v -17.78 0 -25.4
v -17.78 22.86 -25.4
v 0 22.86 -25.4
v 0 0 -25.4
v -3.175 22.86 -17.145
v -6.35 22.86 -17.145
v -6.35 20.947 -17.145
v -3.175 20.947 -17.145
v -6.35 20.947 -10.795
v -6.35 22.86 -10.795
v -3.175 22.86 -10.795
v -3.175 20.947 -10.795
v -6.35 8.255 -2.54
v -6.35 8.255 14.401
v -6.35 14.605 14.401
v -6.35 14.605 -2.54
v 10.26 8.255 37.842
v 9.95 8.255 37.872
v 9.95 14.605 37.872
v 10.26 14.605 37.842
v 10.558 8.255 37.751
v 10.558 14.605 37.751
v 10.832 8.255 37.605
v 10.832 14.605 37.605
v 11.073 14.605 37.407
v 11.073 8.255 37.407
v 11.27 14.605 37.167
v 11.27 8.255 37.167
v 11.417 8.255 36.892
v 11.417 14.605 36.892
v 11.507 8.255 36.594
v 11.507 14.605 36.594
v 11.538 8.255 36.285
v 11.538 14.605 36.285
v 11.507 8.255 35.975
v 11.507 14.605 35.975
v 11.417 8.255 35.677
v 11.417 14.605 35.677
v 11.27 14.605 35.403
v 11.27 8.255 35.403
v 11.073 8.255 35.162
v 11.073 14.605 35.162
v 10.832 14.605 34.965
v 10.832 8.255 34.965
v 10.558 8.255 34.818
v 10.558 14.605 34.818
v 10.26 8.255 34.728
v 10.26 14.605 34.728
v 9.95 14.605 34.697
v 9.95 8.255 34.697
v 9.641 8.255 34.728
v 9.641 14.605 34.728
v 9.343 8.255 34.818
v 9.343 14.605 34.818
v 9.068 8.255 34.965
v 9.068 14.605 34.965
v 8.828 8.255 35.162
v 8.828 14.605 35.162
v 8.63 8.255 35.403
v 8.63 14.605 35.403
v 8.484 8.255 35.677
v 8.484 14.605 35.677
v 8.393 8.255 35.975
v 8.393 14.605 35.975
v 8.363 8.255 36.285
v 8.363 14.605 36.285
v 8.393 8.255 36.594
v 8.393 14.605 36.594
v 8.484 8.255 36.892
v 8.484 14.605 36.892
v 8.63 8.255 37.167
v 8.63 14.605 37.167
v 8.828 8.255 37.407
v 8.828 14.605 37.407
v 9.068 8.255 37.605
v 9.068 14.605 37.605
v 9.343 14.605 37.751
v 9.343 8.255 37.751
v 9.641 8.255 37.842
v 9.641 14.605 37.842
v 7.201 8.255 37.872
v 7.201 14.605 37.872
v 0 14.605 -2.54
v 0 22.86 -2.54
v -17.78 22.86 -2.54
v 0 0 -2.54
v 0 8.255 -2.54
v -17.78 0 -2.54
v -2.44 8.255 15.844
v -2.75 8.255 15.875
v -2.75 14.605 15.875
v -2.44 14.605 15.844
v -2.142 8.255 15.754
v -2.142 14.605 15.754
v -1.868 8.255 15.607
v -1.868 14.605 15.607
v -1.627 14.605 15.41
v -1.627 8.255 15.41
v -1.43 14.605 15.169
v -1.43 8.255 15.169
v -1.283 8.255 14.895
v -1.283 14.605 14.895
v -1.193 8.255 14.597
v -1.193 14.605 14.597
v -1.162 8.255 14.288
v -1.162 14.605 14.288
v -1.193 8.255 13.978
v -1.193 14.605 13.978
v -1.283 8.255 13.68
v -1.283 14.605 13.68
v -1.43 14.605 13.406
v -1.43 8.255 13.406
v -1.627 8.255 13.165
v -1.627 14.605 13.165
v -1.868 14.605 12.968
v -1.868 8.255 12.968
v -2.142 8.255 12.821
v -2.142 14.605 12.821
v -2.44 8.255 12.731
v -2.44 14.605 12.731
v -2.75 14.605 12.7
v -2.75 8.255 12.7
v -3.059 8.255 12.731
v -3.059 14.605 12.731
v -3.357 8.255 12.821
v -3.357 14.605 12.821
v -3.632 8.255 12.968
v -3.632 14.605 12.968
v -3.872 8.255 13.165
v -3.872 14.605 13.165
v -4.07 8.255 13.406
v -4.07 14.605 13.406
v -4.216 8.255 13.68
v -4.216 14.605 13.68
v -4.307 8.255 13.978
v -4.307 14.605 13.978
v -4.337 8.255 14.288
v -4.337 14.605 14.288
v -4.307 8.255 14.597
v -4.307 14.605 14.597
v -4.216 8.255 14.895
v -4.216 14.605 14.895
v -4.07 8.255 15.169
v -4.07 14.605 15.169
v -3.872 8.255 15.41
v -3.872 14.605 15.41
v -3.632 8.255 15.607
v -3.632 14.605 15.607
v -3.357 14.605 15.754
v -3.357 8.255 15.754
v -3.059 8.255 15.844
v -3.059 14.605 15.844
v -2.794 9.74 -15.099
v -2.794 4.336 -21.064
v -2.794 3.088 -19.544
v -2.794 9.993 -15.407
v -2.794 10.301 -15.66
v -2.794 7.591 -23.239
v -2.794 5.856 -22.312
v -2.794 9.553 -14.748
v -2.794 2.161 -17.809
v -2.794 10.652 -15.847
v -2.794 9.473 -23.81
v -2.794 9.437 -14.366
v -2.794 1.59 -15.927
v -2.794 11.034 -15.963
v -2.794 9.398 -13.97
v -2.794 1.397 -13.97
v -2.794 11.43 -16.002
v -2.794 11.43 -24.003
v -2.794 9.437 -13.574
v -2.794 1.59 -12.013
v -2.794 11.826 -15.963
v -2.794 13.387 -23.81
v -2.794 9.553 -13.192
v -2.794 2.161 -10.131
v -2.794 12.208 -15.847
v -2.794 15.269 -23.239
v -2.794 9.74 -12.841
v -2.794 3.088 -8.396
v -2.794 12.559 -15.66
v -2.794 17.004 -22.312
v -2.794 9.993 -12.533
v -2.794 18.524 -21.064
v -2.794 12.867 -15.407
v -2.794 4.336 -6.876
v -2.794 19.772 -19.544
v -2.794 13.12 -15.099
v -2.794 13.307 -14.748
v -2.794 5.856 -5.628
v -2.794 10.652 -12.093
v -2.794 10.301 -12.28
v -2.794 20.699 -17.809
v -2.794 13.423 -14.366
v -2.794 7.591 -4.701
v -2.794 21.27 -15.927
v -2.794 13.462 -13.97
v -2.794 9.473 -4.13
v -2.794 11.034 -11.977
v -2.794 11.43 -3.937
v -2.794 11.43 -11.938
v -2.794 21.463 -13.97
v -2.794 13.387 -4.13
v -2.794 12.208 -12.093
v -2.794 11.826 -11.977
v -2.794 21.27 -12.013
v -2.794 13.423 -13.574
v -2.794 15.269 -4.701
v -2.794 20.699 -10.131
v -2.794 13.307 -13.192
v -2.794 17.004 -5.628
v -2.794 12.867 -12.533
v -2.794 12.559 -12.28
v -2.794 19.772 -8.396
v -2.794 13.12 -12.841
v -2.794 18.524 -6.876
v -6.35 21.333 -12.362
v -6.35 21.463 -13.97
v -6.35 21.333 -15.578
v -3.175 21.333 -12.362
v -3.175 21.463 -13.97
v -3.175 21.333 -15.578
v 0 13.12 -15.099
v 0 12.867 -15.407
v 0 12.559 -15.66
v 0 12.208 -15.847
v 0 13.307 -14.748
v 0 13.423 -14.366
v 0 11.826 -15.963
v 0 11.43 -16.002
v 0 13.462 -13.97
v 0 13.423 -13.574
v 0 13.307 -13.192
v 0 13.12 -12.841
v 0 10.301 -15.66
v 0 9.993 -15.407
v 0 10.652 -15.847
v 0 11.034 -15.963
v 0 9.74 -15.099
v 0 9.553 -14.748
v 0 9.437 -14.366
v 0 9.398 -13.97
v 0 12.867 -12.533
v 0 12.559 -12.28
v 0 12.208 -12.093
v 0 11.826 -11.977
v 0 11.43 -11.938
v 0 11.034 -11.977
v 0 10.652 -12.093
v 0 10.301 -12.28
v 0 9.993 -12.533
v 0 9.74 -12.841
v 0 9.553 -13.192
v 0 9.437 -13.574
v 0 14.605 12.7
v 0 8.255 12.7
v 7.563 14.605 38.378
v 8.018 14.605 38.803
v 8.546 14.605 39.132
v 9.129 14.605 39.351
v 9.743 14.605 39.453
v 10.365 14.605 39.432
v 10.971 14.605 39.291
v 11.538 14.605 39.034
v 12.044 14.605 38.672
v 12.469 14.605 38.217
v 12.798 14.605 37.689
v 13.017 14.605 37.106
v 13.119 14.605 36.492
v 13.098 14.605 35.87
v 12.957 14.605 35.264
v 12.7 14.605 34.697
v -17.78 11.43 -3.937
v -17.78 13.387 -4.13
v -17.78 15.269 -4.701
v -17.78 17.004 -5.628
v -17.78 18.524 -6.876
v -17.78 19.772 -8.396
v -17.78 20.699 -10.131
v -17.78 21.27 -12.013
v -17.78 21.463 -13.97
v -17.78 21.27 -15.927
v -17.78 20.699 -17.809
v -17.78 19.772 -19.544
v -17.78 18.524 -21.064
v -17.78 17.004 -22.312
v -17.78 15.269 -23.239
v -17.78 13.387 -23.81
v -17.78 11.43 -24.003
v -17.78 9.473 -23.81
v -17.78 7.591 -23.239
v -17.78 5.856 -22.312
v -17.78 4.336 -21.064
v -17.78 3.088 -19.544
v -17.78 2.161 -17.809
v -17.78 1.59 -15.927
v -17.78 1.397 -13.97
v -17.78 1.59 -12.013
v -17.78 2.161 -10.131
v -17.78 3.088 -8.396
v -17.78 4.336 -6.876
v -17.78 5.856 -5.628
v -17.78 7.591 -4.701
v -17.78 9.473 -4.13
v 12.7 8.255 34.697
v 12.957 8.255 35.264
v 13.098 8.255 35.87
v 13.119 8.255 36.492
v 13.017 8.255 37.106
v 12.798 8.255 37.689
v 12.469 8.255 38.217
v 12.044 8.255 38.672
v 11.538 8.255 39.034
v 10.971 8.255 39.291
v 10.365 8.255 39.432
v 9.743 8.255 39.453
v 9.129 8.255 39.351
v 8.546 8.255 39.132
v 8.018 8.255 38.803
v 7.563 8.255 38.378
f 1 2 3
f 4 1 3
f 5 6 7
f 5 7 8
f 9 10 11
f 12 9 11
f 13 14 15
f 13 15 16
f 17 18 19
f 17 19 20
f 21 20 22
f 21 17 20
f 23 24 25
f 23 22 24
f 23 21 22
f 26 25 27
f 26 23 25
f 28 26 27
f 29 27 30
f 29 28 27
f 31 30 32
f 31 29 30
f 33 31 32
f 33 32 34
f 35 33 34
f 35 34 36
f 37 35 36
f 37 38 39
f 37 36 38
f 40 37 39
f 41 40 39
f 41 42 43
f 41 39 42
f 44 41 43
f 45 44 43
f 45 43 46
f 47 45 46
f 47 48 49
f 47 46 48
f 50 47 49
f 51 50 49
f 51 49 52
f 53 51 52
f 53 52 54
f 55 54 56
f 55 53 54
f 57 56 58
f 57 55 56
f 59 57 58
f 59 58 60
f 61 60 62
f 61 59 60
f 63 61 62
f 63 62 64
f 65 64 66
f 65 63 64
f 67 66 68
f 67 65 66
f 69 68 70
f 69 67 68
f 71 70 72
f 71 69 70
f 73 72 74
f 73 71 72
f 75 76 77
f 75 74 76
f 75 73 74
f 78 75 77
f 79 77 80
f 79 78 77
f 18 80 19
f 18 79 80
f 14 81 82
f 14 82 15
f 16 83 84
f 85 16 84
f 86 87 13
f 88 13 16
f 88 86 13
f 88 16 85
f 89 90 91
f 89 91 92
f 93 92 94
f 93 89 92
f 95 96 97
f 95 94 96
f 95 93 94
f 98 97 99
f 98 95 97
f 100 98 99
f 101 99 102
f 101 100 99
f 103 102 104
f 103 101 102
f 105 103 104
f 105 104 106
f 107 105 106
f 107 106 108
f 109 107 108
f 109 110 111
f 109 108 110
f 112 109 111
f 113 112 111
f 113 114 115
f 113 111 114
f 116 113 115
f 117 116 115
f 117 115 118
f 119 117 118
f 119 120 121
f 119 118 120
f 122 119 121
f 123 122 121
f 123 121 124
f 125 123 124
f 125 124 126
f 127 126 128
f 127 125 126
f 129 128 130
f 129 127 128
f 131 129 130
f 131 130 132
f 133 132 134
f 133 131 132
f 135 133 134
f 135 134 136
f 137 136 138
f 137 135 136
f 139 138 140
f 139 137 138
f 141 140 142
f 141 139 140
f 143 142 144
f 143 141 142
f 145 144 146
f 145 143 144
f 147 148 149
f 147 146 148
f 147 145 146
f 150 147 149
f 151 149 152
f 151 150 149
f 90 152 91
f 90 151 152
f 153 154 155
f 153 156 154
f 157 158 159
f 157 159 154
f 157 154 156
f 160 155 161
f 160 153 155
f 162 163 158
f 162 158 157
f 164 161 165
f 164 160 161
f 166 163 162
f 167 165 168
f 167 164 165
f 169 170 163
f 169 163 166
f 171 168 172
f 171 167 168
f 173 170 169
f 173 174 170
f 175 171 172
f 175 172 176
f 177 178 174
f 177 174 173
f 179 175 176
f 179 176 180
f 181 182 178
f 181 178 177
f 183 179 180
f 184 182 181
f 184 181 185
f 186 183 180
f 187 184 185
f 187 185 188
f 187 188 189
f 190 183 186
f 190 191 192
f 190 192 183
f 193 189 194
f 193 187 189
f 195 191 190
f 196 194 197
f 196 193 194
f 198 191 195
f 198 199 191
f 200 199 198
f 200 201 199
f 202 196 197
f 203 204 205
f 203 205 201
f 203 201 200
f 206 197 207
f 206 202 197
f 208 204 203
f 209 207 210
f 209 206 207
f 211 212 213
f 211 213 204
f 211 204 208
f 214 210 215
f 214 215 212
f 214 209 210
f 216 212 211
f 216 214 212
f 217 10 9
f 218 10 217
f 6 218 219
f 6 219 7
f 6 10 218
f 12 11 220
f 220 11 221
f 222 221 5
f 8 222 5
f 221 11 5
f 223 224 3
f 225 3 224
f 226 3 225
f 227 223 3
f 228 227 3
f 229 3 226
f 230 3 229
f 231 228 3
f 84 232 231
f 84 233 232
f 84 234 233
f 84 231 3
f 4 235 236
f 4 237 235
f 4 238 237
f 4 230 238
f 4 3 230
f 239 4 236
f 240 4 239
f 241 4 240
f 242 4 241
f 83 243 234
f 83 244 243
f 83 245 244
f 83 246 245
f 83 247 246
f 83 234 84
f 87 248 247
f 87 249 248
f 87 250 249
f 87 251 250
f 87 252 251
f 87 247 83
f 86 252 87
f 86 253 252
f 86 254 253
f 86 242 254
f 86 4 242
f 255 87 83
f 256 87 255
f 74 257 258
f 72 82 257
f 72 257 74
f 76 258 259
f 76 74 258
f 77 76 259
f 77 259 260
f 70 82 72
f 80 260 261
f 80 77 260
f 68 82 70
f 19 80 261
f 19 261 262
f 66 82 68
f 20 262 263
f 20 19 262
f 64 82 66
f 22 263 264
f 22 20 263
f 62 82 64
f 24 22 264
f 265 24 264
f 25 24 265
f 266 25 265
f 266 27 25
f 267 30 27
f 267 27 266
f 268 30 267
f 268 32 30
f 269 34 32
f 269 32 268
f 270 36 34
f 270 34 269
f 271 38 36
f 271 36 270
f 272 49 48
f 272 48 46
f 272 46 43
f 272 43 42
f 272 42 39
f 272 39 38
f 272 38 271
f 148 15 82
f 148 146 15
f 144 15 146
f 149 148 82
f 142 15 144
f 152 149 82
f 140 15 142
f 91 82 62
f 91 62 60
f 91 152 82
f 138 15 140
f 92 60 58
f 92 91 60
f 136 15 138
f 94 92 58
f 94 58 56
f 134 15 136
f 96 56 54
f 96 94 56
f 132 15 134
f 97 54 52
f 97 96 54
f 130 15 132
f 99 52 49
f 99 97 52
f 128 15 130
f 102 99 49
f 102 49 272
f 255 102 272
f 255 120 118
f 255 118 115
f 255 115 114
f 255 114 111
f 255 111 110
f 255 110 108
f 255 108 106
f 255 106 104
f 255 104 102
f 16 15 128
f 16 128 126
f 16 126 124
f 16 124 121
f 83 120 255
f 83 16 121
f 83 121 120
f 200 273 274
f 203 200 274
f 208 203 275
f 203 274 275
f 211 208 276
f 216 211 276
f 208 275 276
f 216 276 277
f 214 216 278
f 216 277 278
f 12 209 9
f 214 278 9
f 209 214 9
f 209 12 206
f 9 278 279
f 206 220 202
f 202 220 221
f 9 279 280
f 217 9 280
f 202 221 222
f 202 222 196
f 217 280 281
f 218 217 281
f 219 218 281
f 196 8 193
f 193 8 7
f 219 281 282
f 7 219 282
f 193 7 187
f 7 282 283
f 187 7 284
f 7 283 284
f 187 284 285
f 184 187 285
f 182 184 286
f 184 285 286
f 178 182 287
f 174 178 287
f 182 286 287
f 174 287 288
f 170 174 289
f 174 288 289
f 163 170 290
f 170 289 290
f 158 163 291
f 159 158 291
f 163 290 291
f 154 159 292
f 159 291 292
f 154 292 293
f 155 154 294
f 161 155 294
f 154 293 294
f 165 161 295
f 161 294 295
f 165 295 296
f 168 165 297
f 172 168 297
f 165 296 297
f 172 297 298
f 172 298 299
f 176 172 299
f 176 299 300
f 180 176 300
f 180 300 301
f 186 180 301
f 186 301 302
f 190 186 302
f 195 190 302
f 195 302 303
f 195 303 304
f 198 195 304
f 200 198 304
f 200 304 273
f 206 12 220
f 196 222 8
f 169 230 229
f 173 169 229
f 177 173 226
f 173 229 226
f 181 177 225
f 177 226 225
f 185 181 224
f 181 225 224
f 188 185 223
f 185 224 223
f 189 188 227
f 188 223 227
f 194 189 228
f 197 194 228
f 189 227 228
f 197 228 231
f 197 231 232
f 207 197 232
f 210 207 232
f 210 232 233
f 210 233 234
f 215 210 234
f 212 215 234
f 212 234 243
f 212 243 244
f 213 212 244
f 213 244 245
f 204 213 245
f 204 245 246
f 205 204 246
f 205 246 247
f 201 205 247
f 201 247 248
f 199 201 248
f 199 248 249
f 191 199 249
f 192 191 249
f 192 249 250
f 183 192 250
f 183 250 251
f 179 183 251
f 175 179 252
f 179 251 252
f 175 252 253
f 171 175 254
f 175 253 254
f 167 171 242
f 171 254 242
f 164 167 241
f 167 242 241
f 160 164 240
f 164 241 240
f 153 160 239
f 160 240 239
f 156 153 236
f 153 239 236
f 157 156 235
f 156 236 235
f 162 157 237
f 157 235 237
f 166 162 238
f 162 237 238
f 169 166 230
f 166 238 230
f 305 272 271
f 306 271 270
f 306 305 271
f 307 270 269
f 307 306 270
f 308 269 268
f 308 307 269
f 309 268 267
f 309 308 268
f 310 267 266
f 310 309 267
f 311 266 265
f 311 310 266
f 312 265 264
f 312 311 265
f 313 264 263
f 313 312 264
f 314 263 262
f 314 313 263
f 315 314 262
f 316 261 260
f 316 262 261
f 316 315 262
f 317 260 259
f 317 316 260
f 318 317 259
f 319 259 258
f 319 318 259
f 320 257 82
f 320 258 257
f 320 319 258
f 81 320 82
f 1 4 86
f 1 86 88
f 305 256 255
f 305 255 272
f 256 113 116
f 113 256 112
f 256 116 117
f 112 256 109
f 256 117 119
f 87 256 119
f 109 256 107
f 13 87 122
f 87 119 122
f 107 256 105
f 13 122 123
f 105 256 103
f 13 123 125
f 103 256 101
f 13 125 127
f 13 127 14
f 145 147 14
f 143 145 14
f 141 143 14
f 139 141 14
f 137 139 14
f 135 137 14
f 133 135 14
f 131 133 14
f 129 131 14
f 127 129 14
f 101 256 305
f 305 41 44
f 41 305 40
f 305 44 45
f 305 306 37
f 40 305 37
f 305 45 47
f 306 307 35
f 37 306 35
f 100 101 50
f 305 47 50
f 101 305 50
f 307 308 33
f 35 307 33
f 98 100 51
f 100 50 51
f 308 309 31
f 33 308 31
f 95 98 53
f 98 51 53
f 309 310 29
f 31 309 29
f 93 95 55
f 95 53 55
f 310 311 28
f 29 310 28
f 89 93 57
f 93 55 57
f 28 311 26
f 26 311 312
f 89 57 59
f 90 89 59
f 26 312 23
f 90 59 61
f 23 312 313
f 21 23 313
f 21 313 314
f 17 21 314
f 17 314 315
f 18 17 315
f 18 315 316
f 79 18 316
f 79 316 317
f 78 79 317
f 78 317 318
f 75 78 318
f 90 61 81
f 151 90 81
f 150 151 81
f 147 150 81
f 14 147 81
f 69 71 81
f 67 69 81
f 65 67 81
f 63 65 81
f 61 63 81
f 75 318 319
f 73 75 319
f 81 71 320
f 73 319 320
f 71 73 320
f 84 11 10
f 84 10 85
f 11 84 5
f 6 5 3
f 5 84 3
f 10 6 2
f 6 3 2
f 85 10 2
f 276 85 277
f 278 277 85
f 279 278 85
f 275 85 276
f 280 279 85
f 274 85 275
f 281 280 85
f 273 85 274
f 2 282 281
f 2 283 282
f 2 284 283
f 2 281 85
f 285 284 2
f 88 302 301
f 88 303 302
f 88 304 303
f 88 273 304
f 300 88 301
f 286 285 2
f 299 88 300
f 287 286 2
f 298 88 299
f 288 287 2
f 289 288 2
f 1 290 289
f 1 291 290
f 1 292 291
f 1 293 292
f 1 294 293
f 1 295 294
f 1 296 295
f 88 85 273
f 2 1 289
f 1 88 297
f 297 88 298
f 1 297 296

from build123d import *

# Parameters (mm, degrees)
SKETCH1_R               = 1.5875
BOSS_EXTRUDE1_DEPTH     = 22.86
TOP_CUT_DEPTH           = 8.255
BOTTOM_CUT_DEPTH        = 8.255
SKETCH5_R               = 10.033
CUT_EXTRUDE1_DEPTH      = 14.986
SKETCH7_R               = 2.032
CUT_EXTRUDE2_DEPTH      = 49.946539324
CUT_EXTRUDE3_REACH      = 50.947
CUT_EXTRUDE3_END_RADIUS = 10.033
SKETCH8_W               = 3.175
SKETCH8_H               = 6.35


with BuildPart() as part:
    # Sketch1 → Boss-Extrude1 (new body)
    with BuildSketch(Plane(origin=(0, 0, 0), x_dir=(1, 0, 0), z_dir=(0, 1, 0))):
        with BuildLine():
            Line((-6.35, -14.401477372), (-6.35, 2.54))
            Line((-6.35, 2.54), (-17.78, 2.54))
            Line((-17.78, 2.54), (-17.78, 25.4))
            Line((-17.78, 25.4), (0, 25.4))
            Line((0, 25.4), (0, -12.7))
            Line((0, -12.7), (12.7, -34.697045256))
            ThreePointArc((12.7, -34.697045256), (11.537869343, -39.034175913), (7.200738686, -37.872045256))
            Line((7.200738686, -37.872045256), (-6.35, -14.401477372))
        make_face()
        with Locations(Location((9.950369343, -36.284545256, 0), (0, 0, 270))):
            Circle(SKETCH1_R, mode=Mode.SUBTRACT)
        with Locations(Location((-2.749630657, -14.2875, 0), (0, 0, 270))):
            Circle(SKETCH1_R, mode=Mode.SUBTRACT)
    extrude(amount=BOSS_EXTRUDE1_DEPTH)

    # Sketch2 → Top Cut (cut)
    with BuildSketch(Plane(origin=(0, 22.86, 0), x_dir=(1, 0, 0), z_dir=(0, 1, 0))):
        Polygon((-6.35, -14.401477372), (8.788238686, -40.621675913), (14.2875, -37.446675913), (0, -12.7), (0, 2.54), (-6.35, 2.54), align=None)
    extrude(amount=-TOP_CUT_DEPTH, mode=Mode.SUBTRACT)

    # Sketch4 → Bottom Cut (cut)
    with BuildSketch(Plane.XZ):
        Polygon((-6.35, -2.54), (-6.35, 14.401477372), (8.788238686, 40.621675913), (14.2875, 37.446675913), (0, 12.7), (0, -2.54), align=None)
    extrude(amount=-BOTTOM_CUT_DEPTH, mode=Mode.SUBTRACT)

    # Sketch5 → Cut-Extrude1 (cut)
    with BuildSketch(Plane.ZY.offset(17.78)):
        with Locations((-13.97, 11.43)):
            Circle(SKETCH5_R)
    extrude(amount=-CUT_EXTRUDE1_DEPTH, mode=Mode.SUBTRACT)

    # Sketch7 → Cut-Extrude2 (cut, through all)
    with BuildSketch(Plane(origin=(0, 0, 0), x_dir=(0, 0, -1), z_dir=(1, 0, 0))):
        with Locations((13.97, 11.43)):
            Circle(SKETCH7_R)
    extrude(amount=-CUT_EXTRUDE2_DEPTH, mode=Mode.SUBTRACT)

    # Cut-Extrude3: up to this cylinder (the profile starts outside it)
    cut_extrude3_end = Plane(origin=(-4.7625, 11.43, -13.97), z_dir=(-1, 0, 0)) * Cylinder(CUT_EXTRUDE3_END_RADIUS, 122.96, mode=Mode.PRIVATE)
    # Sketch8 → Cut-Extrude3 (cut, up to the surface)
    with BuildSketch(Plane(origin=(0, 22.86, 0), x_dir=(1, 0, 0), z_dir=(0, 1, 0)), mode=Mode.PRIVATE) as cut_extrude3_sk1:
        with Locations((-4.7625, 13.97)):
            Rectangle(SKETCH8_W, SKETCH8_H)
    cut_extrude3_tool1 = extrude(cut_extrude3_sk1.sketch, amount=-CUT_EXTRUDE3_REACH, mode=Mode.PRIVATE) - cut_extrude3_end
    add(cut_extrude3_tool1.solids().sort_by_distance((-4.7625, 22.86, -13.97))[0], mode=Mode.SUBTRACT)


solid = part.part
